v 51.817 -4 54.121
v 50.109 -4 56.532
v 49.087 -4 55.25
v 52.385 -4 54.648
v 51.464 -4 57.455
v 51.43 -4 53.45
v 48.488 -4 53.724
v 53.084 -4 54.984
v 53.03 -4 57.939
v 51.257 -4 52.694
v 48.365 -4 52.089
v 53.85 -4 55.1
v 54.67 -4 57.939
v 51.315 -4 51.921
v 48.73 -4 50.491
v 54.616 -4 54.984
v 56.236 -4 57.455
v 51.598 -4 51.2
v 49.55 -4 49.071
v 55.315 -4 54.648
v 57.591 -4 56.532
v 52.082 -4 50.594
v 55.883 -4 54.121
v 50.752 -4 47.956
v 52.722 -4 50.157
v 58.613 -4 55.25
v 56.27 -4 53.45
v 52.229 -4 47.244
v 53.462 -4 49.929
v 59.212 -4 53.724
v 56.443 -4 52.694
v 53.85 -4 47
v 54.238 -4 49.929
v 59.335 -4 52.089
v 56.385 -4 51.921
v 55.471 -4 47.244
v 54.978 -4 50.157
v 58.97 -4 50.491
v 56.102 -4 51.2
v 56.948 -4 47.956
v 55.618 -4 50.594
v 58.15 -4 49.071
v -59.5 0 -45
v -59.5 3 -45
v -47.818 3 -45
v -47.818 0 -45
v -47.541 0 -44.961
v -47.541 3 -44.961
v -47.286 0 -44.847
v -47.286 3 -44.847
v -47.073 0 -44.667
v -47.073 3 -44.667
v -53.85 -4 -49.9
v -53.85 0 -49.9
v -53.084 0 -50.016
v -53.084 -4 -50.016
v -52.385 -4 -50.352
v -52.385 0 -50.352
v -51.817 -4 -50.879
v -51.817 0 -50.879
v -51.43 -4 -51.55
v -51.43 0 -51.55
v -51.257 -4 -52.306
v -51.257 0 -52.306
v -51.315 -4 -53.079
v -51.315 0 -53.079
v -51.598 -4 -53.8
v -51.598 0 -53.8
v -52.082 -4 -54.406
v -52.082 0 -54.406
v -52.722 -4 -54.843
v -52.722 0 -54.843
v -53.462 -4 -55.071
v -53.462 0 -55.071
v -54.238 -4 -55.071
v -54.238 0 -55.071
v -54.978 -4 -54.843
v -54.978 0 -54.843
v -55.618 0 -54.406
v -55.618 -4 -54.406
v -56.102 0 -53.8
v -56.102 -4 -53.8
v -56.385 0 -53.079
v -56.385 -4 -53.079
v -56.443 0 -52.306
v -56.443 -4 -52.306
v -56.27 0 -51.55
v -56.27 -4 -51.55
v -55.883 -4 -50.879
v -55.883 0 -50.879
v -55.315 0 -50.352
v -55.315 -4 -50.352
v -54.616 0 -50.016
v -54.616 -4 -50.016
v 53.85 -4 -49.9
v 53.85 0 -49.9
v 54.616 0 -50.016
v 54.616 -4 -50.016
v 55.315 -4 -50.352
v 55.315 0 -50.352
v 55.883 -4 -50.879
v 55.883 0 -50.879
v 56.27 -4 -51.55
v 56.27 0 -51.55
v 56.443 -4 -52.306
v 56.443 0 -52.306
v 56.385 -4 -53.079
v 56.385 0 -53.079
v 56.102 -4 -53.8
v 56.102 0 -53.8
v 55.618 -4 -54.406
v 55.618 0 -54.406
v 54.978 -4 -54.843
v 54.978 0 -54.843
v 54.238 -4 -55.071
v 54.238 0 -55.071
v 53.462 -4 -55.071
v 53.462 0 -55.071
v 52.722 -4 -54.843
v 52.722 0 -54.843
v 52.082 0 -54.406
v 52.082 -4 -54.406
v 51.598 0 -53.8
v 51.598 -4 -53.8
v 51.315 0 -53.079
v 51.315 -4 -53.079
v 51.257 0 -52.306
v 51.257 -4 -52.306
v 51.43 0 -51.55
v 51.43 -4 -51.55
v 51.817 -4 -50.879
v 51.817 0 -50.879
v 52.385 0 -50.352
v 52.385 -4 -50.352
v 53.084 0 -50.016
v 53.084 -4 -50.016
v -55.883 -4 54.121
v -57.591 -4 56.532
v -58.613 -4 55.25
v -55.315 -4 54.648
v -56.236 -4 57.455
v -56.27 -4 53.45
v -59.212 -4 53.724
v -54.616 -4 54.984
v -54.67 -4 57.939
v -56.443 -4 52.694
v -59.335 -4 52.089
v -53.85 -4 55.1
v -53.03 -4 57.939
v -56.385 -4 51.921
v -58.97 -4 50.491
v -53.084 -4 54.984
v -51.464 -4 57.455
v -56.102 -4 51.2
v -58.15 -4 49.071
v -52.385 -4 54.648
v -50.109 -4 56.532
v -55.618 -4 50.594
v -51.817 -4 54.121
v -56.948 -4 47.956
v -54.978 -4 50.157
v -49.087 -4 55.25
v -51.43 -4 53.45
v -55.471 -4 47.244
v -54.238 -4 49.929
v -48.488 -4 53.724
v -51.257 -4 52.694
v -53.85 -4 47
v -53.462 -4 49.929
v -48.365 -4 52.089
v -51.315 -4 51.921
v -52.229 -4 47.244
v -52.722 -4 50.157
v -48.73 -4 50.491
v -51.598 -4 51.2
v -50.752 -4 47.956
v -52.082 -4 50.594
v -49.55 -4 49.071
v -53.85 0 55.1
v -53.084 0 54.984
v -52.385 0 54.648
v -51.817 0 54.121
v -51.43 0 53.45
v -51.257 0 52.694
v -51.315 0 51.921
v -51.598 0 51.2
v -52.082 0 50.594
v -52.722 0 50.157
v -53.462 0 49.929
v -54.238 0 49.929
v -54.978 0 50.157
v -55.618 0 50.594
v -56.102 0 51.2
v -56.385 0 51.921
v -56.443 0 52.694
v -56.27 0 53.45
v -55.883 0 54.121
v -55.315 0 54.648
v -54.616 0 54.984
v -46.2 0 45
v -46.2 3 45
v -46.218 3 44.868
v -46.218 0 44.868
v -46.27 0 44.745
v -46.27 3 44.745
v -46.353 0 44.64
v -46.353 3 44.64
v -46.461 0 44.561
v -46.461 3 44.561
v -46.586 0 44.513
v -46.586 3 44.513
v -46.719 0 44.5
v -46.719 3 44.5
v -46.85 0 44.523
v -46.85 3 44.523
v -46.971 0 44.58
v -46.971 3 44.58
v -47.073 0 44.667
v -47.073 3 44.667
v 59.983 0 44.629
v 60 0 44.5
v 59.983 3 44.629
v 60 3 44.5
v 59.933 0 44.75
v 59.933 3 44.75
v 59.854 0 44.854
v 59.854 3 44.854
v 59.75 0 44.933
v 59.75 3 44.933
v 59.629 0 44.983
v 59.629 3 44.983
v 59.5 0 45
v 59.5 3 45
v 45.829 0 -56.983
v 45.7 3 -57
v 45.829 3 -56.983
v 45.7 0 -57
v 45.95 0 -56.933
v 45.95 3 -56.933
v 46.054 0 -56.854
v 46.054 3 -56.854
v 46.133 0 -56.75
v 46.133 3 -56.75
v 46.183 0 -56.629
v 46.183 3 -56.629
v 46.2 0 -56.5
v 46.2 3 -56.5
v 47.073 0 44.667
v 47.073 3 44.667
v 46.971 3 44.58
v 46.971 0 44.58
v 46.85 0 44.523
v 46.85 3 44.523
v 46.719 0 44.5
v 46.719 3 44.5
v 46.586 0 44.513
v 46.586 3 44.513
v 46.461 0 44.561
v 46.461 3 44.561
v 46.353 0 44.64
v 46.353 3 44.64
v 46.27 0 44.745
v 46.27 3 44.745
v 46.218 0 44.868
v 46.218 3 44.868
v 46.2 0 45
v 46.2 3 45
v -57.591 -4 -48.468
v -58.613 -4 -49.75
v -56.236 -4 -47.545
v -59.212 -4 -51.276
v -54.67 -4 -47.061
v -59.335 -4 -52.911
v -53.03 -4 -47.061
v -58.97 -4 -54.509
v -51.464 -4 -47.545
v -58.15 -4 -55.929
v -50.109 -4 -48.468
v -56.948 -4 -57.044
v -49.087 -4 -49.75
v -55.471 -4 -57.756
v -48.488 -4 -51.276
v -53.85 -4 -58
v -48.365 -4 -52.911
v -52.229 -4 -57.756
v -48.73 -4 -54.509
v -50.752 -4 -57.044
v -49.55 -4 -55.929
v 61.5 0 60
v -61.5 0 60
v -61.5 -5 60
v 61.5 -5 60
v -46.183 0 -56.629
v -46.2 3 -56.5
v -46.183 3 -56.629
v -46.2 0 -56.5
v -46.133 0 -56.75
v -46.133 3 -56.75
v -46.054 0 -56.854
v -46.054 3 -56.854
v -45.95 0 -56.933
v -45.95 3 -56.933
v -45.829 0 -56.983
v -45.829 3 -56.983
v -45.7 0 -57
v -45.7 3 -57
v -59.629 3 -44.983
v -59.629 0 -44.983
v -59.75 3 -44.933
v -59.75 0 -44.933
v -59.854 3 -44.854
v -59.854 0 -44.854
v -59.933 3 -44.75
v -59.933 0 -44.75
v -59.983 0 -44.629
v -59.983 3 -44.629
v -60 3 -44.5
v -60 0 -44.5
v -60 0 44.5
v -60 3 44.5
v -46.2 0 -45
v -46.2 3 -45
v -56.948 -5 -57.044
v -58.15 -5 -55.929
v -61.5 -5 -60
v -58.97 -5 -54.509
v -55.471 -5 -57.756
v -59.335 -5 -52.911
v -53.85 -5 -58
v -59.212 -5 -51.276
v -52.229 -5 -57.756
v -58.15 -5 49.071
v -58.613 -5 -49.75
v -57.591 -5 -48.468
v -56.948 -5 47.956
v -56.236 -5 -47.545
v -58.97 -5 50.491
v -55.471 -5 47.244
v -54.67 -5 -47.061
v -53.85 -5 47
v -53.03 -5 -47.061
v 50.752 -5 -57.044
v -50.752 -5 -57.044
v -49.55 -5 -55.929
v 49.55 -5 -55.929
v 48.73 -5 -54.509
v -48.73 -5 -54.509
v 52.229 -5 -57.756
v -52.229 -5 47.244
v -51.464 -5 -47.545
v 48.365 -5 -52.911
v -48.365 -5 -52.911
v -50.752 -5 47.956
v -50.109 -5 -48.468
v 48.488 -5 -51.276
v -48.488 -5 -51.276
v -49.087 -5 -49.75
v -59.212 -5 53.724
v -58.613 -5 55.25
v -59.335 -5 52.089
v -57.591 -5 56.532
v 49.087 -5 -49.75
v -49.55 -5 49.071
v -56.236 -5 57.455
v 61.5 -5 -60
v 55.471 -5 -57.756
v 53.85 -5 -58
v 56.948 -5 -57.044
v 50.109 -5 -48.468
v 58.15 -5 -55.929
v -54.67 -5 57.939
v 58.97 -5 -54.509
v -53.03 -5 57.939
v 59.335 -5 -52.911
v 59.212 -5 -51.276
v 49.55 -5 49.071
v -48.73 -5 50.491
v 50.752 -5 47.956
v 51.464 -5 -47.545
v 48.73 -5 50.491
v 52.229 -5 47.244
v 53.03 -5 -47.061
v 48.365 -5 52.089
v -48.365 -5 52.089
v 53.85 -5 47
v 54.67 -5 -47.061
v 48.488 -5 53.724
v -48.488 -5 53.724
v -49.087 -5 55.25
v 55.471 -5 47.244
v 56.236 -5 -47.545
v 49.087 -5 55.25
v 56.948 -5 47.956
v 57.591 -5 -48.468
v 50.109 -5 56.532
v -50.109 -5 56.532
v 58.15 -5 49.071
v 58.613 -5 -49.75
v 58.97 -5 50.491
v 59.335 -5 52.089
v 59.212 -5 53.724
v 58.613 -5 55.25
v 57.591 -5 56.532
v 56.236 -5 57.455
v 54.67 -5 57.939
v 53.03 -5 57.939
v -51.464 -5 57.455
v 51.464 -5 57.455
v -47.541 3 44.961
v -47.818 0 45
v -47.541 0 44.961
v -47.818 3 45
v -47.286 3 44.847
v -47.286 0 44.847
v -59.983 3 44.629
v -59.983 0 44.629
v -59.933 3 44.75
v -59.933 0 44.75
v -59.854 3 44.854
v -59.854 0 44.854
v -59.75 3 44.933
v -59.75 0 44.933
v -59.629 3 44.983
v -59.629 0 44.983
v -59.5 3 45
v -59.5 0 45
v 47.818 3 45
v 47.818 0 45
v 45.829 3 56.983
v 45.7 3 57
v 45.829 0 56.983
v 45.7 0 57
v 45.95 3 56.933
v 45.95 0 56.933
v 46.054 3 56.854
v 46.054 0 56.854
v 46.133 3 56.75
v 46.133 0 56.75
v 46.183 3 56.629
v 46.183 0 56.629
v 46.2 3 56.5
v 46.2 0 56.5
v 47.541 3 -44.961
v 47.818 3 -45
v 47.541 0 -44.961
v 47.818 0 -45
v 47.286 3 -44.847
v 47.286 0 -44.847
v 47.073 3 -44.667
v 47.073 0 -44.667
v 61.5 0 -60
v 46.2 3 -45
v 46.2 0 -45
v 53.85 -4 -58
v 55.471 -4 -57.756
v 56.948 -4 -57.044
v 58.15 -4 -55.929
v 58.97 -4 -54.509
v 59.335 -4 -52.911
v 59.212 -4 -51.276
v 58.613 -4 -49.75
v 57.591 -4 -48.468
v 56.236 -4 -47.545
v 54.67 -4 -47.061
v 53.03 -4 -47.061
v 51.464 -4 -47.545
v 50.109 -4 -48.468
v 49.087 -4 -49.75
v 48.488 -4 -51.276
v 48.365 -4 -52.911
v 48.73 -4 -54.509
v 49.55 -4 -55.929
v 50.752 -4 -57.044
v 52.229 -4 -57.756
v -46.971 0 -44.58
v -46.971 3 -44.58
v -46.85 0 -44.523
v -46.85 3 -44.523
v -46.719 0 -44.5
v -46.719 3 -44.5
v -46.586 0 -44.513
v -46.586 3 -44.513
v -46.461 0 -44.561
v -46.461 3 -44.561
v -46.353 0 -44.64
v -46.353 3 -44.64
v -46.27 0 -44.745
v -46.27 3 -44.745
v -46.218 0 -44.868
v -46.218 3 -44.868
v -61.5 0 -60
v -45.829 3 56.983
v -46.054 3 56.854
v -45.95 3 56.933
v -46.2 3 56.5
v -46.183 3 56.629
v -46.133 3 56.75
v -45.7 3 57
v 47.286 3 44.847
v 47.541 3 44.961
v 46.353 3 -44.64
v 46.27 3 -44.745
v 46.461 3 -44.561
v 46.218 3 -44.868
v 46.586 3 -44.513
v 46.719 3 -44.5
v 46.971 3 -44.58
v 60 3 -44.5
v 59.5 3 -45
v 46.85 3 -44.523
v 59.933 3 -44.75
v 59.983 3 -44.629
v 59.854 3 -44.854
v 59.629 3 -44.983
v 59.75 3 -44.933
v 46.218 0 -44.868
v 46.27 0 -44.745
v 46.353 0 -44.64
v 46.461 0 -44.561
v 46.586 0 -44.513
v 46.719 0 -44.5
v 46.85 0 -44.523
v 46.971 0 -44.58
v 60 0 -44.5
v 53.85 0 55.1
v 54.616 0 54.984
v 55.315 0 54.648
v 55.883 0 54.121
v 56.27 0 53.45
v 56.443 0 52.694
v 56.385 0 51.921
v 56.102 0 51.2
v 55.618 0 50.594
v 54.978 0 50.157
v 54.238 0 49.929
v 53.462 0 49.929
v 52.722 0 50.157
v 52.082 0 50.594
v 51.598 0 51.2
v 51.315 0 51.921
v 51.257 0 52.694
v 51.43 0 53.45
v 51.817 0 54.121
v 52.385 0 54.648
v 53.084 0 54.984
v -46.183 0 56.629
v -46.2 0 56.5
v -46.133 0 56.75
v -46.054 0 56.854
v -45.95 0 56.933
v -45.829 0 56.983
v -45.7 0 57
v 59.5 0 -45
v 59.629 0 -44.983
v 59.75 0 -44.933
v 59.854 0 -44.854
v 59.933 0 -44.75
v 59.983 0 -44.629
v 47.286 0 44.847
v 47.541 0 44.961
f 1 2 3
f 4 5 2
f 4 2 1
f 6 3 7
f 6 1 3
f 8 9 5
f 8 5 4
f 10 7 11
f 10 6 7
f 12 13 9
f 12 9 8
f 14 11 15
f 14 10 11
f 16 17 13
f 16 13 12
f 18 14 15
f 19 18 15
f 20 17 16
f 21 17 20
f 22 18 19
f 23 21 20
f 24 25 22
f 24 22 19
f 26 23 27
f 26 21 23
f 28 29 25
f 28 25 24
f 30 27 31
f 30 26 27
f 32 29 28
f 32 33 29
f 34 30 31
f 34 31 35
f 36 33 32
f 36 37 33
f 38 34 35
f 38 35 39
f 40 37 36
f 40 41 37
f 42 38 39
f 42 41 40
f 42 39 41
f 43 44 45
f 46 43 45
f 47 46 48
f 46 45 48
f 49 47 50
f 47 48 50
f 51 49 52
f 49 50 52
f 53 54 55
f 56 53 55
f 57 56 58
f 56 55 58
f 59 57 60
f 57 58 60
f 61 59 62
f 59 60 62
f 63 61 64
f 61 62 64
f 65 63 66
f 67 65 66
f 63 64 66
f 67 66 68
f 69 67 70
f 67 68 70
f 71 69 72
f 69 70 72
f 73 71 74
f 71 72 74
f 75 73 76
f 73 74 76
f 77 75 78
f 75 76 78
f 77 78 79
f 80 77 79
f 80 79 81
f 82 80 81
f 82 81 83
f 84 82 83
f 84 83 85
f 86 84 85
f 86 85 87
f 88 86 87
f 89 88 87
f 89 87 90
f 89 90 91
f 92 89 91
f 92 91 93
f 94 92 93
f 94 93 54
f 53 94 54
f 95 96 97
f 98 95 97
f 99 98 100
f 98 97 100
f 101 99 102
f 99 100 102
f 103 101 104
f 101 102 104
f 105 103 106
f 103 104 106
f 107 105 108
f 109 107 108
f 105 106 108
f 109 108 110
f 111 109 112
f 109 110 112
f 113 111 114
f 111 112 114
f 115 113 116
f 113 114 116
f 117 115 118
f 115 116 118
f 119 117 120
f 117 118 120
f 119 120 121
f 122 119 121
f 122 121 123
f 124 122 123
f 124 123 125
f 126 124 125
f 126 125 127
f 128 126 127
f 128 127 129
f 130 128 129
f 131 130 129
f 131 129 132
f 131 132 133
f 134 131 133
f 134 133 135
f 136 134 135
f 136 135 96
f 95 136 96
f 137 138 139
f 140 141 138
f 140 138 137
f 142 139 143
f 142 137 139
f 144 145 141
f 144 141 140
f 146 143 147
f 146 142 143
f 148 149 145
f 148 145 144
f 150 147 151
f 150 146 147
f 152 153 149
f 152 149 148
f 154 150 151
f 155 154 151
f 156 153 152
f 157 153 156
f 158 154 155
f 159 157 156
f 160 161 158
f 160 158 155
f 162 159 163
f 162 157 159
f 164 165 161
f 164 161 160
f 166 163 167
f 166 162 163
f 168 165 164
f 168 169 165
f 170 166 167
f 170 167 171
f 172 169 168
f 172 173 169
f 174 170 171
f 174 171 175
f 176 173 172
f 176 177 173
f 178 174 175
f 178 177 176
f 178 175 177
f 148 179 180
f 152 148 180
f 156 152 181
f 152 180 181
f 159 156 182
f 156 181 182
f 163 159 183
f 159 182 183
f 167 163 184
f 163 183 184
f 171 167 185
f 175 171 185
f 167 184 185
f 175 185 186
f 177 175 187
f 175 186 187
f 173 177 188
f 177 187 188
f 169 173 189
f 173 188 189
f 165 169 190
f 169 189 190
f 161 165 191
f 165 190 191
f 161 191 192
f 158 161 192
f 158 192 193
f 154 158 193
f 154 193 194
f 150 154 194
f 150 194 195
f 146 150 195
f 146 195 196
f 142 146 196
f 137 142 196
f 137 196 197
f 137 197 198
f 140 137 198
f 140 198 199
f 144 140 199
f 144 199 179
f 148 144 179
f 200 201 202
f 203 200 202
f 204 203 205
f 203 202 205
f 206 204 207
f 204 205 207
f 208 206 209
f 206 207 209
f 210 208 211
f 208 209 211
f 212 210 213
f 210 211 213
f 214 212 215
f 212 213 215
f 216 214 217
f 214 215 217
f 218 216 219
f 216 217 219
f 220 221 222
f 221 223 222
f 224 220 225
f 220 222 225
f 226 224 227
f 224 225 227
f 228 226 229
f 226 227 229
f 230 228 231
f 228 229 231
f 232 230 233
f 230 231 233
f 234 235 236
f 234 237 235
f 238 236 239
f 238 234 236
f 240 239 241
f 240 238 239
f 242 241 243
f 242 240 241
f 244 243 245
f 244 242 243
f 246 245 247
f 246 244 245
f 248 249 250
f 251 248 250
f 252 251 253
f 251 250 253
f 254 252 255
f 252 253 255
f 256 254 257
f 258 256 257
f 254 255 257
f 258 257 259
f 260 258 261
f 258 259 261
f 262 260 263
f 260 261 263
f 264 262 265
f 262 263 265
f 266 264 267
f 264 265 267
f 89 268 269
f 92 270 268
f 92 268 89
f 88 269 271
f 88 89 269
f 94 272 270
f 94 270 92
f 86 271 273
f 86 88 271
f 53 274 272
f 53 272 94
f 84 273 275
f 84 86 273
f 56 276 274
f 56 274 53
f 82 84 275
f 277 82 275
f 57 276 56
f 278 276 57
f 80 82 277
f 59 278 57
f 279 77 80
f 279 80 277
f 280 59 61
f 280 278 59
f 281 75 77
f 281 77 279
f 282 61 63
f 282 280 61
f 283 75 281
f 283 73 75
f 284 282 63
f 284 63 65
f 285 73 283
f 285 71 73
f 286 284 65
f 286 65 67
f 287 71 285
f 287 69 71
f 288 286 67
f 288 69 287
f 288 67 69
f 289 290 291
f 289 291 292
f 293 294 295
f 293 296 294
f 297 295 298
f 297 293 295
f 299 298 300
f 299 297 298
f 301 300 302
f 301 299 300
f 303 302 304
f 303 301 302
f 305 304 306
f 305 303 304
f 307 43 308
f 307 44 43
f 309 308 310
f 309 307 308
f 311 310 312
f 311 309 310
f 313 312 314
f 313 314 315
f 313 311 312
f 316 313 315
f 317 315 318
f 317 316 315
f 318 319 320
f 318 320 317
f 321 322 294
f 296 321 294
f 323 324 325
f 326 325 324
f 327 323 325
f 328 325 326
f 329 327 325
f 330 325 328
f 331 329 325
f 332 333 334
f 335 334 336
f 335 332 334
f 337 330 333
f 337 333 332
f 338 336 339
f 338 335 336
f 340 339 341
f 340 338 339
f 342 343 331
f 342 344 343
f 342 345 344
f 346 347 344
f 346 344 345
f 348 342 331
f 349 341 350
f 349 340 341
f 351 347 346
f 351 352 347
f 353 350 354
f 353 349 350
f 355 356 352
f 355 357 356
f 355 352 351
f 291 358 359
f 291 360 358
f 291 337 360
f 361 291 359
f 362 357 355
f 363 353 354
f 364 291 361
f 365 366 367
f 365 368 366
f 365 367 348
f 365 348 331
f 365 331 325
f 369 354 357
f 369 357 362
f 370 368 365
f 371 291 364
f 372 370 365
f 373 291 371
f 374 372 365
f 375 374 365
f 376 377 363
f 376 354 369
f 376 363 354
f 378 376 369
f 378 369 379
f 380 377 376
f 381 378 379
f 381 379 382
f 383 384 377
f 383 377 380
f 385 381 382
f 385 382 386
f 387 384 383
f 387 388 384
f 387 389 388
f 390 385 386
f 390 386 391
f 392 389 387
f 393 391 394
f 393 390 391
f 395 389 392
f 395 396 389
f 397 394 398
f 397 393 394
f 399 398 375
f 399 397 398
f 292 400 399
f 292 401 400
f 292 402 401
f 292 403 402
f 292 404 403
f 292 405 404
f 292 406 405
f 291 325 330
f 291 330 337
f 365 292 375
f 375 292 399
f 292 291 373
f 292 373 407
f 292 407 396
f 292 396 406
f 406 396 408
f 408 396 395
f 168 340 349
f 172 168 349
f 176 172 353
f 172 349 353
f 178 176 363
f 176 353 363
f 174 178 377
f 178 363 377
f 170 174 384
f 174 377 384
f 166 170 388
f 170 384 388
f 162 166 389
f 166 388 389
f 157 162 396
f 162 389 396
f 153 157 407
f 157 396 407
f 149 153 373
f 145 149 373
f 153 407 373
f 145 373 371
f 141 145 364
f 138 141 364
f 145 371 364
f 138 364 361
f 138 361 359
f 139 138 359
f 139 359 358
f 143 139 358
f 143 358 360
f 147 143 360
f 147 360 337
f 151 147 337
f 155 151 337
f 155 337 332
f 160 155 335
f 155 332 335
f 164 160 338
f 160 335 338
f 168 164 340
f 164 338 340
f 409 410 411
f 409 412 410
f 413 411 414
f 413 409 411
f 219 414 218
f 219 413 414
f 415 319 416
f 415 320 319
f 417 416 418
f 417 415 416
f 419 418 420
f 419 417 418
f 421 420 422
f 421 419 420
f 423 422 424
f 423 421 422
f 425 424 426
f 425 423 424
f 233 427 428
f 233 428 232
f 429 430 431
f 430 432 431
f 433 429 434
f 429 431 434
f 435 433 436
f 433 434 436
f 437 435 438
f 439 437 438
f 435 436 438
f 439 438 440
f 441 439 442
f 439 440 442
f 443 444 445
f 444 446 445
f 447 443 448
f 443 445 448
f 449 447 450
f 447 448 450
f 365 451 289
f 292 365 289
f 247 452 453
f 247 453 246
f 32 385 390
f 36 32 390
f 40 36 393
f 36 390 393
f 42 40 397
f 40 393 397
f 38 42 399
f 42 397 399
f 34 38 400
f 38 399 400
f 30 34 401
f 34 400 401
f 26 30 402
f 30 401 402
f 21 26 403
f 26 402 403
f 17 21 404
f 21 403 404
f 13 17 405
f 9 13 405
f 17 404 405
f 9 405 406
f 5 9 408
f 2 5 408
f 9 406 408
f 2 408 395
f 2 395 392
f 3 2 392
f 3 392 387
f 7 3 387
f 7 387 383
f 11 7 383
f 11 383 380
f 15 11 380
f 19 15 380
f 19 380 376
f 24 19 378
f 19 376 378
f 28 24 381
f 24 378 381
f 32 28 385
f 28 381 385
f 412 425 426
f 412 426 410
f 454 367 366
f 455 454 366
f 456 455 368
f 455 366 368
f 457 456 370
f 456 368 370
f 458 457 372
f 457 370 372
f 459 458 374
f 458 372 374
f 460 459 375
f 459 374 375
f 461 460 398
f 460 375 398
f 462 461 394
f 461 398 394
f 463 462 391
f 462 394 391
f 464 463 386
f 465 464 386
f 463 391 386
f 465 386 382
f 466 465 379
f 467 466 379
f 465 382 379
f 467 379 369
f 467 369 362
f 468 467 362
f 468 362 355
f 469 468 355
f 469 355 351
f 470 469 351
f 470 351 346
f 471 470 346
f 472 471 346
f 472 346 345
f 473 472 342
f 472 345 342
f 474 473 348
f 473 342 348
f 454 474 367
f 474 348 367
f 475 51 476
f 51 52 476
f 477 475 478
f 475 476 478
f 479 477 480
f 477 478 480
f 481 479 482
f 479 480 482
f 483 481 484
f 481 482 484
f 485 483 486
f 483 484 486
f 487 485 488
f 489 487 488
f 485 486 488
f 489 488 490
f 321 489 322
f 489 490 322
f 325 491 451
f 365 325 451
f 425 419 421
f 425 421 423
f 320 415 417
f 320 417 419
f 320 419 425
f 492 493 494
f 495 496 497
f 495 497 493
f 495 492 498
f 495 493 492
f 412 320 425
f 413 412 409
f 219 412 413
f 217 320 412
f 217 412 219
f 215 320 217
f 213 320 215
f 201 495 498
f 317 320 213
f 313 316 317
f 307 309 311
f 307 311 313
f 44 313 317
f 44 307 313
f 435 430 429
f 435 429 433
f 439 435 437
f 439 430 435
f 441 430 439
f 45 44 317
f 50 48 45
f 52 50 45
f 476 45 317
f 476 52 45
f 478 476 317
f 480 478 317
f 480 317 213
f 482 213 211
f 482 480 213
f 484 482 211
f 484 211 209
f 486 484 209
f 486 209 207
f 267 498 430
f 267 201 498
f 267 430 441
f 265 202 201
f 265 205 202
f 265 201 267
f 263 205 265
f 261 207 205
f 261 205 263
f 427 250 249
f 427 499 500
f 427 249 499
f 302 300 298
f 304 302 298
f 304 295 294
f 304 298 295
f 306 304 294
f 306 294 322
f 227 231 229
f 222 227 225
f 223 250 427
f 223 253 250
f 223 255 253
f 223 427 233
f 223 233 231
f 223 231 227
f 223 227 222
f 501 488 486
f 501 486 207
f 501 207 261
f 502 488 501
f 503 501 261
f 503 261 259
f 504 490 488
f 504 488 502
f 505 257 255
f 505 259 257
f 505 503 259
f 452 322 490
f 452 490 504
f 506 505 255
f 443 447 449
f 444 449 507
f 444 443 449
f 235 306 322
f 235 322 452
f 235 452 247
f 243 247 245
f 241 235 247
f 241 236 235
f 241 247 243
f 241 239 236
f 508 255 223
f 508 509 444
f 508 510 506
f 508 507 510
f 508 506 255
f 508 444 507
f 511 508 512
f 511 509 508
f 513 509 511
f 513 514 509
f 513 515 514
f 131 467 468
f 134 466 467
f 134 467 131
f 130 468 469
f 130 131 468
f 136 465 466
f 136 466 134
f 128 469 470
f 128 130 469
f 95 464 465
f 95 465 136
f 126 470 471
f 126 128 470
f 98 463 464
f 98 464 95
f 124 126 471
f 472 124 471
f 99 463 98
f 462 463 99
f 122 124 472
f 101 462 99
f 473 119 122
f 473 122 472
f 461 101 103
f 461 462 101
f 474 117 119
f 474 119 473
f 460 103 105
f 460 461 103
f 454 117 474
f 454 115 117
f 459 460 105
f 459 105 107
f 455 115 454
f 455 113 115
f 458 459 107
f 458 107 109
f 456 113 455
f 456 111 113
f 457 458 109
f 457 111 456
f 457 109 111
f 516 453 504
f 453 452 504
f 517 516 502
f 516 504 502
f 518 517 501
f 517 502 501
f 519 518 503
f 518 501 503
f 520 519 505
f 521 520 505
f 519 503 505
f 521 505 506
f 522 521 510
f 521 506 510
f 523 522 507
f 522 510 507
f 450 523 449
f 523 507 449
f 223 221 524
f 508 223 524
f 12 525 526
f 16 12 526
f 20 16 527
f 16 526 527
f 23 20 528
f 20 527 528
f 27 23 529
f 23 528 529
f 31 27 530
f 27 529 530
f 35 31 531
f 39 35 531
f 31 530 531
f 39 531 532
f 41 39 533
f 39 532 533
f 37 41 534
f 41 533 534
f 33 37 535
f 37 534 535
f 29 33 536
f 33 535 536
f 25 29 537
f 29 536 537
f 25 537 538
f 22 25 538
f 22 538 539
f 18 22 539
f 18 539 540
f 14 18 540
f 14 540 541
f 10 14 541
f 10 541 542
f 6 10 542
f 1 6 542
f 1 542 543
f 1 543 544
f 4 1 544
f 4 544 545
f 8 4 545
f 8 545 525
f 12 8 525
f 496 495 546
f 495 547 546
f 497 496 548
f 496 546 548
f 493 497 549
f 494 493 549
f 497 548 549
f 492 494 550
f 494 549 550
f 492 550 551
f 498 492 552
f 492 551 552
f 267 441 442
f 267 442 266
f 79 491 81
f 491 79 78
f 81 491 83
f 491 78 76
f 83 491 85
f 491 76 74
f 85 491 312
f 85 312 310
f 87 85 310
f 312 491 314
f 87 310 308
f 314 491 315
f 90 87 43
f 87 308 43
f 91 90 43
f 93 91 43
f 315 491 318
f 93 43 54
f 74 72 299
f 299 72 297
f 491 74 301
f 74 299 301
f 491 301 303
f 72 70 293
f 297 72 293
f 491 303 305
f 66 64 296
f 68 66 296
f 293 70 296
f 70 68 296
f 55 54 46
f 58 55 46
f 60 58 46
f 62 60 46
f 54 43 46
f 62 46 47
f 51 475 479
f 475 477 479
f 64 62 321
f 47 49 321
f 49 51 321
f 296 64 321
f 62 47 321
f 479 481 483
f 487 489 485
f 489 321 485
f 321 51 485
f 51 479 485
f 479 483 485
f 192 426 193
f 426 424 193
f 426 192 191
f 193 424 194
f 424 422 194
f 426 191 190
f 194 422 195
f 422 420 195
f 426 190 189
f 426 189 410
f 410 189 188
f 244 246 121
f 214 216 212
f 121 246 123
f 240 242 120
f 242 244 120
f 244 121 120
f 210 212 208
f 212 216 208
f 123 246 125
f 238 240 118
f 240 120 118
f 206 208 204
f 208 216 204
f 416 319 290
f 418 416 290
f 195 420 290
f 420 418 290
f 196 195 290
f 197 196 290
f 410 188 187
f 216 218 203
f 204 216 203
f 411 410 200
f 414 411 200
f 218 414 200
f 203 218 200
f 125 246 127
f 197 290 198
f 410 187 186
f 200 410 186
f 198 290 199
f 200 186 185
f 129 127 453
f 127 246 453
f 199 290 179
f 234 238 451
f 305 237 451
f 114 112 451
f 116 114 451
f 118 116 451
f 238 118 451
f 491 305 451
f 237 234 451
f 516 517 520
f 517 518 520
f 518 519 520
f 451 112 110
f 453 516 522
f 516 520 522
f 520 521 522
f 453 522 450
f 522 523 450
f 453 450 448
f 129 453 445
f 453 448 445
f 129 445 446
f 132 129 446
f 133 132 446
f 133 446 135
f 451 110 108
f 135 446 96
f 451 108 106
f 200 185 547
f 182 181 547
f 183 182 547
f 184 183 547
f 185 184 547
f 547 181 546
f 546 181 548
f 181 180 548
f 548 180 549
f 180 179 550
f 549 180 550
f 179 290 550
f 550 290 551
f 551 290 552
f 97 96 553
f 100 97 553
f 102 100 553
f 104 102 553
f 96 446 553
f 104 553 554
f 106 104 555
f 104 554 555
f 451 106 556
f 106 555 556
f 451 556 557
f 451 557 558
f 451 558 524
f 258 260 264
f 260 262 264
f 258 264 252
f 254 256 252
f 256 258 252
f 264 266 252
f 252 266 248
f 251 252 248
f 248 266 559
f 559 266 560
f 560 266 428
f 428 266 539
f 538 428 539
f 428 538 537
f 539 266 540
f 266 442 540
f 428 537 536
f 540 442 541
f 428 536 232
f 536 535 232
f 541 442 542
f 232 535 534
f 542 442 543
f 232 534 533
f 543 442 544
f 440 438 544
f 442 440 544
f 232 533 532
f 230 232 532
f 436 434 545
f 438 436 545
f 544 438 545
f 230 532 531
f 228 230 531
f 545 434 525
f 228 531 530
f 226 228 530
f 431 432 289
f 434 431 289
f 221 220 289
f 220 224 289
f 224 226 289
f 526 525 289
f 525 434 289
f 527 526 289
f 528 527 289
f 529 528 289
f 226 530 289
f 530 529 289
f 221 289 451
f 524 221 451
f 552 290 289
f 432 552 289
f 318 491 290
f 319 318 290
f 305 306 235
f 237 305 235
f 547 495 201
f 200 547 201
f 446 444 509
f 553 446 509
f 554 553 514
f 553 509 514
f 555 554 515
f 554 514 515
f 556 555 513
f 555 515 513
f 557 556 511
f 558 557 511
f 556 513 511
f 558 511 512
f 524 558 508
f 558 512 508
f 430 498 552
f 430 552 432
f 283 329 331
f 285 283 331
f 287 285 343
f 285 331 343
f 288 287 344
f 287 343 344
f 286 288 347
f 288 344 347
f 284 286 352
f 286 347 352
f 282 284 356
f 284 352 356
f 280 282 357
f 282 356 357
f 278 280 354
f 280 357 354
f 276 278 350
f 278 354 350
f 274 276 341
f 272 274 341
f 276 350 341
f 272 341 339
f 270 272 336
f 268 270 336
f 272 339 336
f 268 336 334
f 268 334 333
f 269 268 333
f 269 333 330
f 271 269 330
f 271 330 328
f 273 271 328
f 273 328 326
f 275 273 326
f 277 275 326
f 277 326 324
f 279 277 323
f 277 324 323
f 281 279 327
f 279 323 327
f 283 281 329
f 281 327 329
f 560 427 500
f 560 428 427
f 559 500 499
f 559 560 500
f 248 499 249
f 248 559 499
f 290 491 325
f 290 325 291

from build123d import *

# Parameters (mm, degrees)
SKETCH_1_W          = 120
SKETCH_1_H          = 120
EXTRUDE_1_DEPTH     = 3
SKETCH_3_W          = 123
SKETCH_3_H          = 120
EXTRUDE_2_DEPTH     = 5
SKETCH_5_W          = 15.3
SKETCH_5_H          = 15
CUT_EXTRUDE_2_DEPTH = 3
SKETCH_6_R          = 2.6
CUT_EXTRUDE_3_DEPTH = 87.291656607
SKETCH_7_R          = 5.5
CUT_EXTRUDE_4_DEPTH = 1
SKETCH_8_W          = 92.4
SKETCH_8_H          = 3
CUT_EXTRUDE_5_DEPTH = 3
SKETCH_9_R          = 0.5
CUT_EXTRUDE_6_DEPTH = 3
FILLET_1_R          = 1
FILLET_2_R          = 0.5


with BuildPart() as part:
    # 草图1 → 凸台-拉伸1 (new body)
    with BuildSketch(Plane(origin=(0, 0, 0), x_dir=(1, 0, 0), z_dir=(0, 1, 0))):
        Rectangle(SKETCH_1_W, SKETCH_1_H)
    extrude(amount=EXTRUDE_1_DEPTH)

    # 草图3 → 凸台-拉伸2 (add)
    with BuildSketch(Plane.XZ):
        Rectangle(SKETCH_3_W, SKETCH_3_H)
    extrude(amount=EXTRUDE_2_DEPTH)

    # 草图5 → 切除-拉伸2 (cut)
    with BuildSketch(Plane(origin=(0, 3, 0), x_dir=(1, 0, 0), z_dir=(0, 1, 0))):
        with Locations((-53.85, 52.5)):
            Rectangle(SKETCH_5_W, SKETCH_5_H)
        with Locations((53.85, 52.5)):
            Rectangle(SKETCH_5_W, SKETCH_5_H)
        with Locations((-53.85, -52.5)):
            Rectangle(SKETCH_5_W, SKETCH_5_H)
        with Locations((53.85, -52.5)):
            Rectangle(SKETCH_5_W, SKETCH_5_H)
    extrude(amount=-CUT_EXTRUDE_2_DEPTH, mode=Mode.SUBTRACT)

    # 草图6 → 切除-拉伸3 (cut, through all)
    with BuildSketch(Plane(origin=(0, 3, 0), x_dir=(1, 0, 0), z_dir=(0, 1, 0))):
        with Locations(Location((-53.85, 52.5, 0), (0, 0, 270))):
            Circle(SKETCH_6_R)
        with Locations(Location((53.85, 52.5, 0), (0, 0, 270))):
            Circle(SKETCH_6_R)
        with Locations(Location((-53.85, -52.5, 0), (0, 0, 270))):
            Circle(SKETCH_6_R)
        with Locations(Location((53.85, -52.5, 0), (0, 0, 270))):
            Circle(SKETCH_6_R)
    extrude(amount=-CUT_EXTRUDE_3_DEPTH, mode=Mode.SUBTRACT)

    # 草图7 → 切除-拉伸4 (cut)
    with BuildSketch(Plane.XZ.offset(5)):
        with Locations(Location((-53.85, 52.5, 0), (0, 0, 270))):
            Circle(SKETCH_7_R)
        with Locations(Location((-53.85, -52.5, 0), (0, 0, 270))):
            Circle(SKETCH_7_R)
        with Locations(Location((53.85, 52.5, 0), (0, 0, 270))):
            Circle(SKETCH_7_R)
        with Locations(Location((53.85, -52.5, 0), (0, 0, 270))):
            Circle(SKETCH_7_R)
    extrude(amount=-CUT_EXTRUDE_4_DEPTH, mode=Mode.SUBTRACT)

    # 草图8 → 切除-拉伸5 (cut)
    with BuildSketch(Plane(origin=(0, 3, 0), x_dir=(1, 0, 0), z_dir=(0, 1, 0))):
        with Locations((0, 58.5)):
            Rectangle(SKETCH_8_W, SKETCH_8_H)
        with Locations((0, -58.5)):
            Rectangle(SKETCH_8_W, SKETCH_8_H)
    extrude(amount=-CUT_EXTRUDE_5_DEPTH, mode=Mode.SUBTRACT)

    # 草图9 → 切除-拉伸6 (cut)
    with BuildSketch(Plane(origin=(0, 3, 0), x_dir=(1, 0, 0), z_dir=(0, 1, 0))):
        with Locations((-46.7, 45)):
            Circle(SKETCH_9_R)
        with Locations((46.7, 45)):
            Circle(SKETCH_9_R)
        with Locations((-46.7, -45)):
            Circle(SKETCH_9_R)
        with Locations((46.7, -45)):
            Circle(SKETCH_9_R)
    extrude(amount=-CUT_EXTRUDE_6_DEPTH, mode=Mode.SUBTRACT)

    # 圆角1
    fillet_1_edges = [part.edges().sort_by_distance(p)[0] for p in [
        (47.2, 1.5, -45),
        (-47.2, 1.5, 45),
        (47.2, 1.5, 45),
        (-47.2, 1.5, -45),
    ]]
    fillet(fillet_1_edges, radius=FILLET_1_R)

    # 圆角2
    fillet_2_edges = [part.edges().sort_by_distance(p)[0] for p in [
        (46.2, 1.5, -57),
        (-46.2, 1.5, -57),
        (-46.2, 1.5, 57),
        (46.2, 1.5, 57),
        (60, 1.5, -45),
        (-60, 1.5, 45),
        (60, 1.5, 45),
        (-60, 1.5, -45),
    ]]
    fillet(fillet_2_edges, radius=FILLET_2_R)


solid = part.part
